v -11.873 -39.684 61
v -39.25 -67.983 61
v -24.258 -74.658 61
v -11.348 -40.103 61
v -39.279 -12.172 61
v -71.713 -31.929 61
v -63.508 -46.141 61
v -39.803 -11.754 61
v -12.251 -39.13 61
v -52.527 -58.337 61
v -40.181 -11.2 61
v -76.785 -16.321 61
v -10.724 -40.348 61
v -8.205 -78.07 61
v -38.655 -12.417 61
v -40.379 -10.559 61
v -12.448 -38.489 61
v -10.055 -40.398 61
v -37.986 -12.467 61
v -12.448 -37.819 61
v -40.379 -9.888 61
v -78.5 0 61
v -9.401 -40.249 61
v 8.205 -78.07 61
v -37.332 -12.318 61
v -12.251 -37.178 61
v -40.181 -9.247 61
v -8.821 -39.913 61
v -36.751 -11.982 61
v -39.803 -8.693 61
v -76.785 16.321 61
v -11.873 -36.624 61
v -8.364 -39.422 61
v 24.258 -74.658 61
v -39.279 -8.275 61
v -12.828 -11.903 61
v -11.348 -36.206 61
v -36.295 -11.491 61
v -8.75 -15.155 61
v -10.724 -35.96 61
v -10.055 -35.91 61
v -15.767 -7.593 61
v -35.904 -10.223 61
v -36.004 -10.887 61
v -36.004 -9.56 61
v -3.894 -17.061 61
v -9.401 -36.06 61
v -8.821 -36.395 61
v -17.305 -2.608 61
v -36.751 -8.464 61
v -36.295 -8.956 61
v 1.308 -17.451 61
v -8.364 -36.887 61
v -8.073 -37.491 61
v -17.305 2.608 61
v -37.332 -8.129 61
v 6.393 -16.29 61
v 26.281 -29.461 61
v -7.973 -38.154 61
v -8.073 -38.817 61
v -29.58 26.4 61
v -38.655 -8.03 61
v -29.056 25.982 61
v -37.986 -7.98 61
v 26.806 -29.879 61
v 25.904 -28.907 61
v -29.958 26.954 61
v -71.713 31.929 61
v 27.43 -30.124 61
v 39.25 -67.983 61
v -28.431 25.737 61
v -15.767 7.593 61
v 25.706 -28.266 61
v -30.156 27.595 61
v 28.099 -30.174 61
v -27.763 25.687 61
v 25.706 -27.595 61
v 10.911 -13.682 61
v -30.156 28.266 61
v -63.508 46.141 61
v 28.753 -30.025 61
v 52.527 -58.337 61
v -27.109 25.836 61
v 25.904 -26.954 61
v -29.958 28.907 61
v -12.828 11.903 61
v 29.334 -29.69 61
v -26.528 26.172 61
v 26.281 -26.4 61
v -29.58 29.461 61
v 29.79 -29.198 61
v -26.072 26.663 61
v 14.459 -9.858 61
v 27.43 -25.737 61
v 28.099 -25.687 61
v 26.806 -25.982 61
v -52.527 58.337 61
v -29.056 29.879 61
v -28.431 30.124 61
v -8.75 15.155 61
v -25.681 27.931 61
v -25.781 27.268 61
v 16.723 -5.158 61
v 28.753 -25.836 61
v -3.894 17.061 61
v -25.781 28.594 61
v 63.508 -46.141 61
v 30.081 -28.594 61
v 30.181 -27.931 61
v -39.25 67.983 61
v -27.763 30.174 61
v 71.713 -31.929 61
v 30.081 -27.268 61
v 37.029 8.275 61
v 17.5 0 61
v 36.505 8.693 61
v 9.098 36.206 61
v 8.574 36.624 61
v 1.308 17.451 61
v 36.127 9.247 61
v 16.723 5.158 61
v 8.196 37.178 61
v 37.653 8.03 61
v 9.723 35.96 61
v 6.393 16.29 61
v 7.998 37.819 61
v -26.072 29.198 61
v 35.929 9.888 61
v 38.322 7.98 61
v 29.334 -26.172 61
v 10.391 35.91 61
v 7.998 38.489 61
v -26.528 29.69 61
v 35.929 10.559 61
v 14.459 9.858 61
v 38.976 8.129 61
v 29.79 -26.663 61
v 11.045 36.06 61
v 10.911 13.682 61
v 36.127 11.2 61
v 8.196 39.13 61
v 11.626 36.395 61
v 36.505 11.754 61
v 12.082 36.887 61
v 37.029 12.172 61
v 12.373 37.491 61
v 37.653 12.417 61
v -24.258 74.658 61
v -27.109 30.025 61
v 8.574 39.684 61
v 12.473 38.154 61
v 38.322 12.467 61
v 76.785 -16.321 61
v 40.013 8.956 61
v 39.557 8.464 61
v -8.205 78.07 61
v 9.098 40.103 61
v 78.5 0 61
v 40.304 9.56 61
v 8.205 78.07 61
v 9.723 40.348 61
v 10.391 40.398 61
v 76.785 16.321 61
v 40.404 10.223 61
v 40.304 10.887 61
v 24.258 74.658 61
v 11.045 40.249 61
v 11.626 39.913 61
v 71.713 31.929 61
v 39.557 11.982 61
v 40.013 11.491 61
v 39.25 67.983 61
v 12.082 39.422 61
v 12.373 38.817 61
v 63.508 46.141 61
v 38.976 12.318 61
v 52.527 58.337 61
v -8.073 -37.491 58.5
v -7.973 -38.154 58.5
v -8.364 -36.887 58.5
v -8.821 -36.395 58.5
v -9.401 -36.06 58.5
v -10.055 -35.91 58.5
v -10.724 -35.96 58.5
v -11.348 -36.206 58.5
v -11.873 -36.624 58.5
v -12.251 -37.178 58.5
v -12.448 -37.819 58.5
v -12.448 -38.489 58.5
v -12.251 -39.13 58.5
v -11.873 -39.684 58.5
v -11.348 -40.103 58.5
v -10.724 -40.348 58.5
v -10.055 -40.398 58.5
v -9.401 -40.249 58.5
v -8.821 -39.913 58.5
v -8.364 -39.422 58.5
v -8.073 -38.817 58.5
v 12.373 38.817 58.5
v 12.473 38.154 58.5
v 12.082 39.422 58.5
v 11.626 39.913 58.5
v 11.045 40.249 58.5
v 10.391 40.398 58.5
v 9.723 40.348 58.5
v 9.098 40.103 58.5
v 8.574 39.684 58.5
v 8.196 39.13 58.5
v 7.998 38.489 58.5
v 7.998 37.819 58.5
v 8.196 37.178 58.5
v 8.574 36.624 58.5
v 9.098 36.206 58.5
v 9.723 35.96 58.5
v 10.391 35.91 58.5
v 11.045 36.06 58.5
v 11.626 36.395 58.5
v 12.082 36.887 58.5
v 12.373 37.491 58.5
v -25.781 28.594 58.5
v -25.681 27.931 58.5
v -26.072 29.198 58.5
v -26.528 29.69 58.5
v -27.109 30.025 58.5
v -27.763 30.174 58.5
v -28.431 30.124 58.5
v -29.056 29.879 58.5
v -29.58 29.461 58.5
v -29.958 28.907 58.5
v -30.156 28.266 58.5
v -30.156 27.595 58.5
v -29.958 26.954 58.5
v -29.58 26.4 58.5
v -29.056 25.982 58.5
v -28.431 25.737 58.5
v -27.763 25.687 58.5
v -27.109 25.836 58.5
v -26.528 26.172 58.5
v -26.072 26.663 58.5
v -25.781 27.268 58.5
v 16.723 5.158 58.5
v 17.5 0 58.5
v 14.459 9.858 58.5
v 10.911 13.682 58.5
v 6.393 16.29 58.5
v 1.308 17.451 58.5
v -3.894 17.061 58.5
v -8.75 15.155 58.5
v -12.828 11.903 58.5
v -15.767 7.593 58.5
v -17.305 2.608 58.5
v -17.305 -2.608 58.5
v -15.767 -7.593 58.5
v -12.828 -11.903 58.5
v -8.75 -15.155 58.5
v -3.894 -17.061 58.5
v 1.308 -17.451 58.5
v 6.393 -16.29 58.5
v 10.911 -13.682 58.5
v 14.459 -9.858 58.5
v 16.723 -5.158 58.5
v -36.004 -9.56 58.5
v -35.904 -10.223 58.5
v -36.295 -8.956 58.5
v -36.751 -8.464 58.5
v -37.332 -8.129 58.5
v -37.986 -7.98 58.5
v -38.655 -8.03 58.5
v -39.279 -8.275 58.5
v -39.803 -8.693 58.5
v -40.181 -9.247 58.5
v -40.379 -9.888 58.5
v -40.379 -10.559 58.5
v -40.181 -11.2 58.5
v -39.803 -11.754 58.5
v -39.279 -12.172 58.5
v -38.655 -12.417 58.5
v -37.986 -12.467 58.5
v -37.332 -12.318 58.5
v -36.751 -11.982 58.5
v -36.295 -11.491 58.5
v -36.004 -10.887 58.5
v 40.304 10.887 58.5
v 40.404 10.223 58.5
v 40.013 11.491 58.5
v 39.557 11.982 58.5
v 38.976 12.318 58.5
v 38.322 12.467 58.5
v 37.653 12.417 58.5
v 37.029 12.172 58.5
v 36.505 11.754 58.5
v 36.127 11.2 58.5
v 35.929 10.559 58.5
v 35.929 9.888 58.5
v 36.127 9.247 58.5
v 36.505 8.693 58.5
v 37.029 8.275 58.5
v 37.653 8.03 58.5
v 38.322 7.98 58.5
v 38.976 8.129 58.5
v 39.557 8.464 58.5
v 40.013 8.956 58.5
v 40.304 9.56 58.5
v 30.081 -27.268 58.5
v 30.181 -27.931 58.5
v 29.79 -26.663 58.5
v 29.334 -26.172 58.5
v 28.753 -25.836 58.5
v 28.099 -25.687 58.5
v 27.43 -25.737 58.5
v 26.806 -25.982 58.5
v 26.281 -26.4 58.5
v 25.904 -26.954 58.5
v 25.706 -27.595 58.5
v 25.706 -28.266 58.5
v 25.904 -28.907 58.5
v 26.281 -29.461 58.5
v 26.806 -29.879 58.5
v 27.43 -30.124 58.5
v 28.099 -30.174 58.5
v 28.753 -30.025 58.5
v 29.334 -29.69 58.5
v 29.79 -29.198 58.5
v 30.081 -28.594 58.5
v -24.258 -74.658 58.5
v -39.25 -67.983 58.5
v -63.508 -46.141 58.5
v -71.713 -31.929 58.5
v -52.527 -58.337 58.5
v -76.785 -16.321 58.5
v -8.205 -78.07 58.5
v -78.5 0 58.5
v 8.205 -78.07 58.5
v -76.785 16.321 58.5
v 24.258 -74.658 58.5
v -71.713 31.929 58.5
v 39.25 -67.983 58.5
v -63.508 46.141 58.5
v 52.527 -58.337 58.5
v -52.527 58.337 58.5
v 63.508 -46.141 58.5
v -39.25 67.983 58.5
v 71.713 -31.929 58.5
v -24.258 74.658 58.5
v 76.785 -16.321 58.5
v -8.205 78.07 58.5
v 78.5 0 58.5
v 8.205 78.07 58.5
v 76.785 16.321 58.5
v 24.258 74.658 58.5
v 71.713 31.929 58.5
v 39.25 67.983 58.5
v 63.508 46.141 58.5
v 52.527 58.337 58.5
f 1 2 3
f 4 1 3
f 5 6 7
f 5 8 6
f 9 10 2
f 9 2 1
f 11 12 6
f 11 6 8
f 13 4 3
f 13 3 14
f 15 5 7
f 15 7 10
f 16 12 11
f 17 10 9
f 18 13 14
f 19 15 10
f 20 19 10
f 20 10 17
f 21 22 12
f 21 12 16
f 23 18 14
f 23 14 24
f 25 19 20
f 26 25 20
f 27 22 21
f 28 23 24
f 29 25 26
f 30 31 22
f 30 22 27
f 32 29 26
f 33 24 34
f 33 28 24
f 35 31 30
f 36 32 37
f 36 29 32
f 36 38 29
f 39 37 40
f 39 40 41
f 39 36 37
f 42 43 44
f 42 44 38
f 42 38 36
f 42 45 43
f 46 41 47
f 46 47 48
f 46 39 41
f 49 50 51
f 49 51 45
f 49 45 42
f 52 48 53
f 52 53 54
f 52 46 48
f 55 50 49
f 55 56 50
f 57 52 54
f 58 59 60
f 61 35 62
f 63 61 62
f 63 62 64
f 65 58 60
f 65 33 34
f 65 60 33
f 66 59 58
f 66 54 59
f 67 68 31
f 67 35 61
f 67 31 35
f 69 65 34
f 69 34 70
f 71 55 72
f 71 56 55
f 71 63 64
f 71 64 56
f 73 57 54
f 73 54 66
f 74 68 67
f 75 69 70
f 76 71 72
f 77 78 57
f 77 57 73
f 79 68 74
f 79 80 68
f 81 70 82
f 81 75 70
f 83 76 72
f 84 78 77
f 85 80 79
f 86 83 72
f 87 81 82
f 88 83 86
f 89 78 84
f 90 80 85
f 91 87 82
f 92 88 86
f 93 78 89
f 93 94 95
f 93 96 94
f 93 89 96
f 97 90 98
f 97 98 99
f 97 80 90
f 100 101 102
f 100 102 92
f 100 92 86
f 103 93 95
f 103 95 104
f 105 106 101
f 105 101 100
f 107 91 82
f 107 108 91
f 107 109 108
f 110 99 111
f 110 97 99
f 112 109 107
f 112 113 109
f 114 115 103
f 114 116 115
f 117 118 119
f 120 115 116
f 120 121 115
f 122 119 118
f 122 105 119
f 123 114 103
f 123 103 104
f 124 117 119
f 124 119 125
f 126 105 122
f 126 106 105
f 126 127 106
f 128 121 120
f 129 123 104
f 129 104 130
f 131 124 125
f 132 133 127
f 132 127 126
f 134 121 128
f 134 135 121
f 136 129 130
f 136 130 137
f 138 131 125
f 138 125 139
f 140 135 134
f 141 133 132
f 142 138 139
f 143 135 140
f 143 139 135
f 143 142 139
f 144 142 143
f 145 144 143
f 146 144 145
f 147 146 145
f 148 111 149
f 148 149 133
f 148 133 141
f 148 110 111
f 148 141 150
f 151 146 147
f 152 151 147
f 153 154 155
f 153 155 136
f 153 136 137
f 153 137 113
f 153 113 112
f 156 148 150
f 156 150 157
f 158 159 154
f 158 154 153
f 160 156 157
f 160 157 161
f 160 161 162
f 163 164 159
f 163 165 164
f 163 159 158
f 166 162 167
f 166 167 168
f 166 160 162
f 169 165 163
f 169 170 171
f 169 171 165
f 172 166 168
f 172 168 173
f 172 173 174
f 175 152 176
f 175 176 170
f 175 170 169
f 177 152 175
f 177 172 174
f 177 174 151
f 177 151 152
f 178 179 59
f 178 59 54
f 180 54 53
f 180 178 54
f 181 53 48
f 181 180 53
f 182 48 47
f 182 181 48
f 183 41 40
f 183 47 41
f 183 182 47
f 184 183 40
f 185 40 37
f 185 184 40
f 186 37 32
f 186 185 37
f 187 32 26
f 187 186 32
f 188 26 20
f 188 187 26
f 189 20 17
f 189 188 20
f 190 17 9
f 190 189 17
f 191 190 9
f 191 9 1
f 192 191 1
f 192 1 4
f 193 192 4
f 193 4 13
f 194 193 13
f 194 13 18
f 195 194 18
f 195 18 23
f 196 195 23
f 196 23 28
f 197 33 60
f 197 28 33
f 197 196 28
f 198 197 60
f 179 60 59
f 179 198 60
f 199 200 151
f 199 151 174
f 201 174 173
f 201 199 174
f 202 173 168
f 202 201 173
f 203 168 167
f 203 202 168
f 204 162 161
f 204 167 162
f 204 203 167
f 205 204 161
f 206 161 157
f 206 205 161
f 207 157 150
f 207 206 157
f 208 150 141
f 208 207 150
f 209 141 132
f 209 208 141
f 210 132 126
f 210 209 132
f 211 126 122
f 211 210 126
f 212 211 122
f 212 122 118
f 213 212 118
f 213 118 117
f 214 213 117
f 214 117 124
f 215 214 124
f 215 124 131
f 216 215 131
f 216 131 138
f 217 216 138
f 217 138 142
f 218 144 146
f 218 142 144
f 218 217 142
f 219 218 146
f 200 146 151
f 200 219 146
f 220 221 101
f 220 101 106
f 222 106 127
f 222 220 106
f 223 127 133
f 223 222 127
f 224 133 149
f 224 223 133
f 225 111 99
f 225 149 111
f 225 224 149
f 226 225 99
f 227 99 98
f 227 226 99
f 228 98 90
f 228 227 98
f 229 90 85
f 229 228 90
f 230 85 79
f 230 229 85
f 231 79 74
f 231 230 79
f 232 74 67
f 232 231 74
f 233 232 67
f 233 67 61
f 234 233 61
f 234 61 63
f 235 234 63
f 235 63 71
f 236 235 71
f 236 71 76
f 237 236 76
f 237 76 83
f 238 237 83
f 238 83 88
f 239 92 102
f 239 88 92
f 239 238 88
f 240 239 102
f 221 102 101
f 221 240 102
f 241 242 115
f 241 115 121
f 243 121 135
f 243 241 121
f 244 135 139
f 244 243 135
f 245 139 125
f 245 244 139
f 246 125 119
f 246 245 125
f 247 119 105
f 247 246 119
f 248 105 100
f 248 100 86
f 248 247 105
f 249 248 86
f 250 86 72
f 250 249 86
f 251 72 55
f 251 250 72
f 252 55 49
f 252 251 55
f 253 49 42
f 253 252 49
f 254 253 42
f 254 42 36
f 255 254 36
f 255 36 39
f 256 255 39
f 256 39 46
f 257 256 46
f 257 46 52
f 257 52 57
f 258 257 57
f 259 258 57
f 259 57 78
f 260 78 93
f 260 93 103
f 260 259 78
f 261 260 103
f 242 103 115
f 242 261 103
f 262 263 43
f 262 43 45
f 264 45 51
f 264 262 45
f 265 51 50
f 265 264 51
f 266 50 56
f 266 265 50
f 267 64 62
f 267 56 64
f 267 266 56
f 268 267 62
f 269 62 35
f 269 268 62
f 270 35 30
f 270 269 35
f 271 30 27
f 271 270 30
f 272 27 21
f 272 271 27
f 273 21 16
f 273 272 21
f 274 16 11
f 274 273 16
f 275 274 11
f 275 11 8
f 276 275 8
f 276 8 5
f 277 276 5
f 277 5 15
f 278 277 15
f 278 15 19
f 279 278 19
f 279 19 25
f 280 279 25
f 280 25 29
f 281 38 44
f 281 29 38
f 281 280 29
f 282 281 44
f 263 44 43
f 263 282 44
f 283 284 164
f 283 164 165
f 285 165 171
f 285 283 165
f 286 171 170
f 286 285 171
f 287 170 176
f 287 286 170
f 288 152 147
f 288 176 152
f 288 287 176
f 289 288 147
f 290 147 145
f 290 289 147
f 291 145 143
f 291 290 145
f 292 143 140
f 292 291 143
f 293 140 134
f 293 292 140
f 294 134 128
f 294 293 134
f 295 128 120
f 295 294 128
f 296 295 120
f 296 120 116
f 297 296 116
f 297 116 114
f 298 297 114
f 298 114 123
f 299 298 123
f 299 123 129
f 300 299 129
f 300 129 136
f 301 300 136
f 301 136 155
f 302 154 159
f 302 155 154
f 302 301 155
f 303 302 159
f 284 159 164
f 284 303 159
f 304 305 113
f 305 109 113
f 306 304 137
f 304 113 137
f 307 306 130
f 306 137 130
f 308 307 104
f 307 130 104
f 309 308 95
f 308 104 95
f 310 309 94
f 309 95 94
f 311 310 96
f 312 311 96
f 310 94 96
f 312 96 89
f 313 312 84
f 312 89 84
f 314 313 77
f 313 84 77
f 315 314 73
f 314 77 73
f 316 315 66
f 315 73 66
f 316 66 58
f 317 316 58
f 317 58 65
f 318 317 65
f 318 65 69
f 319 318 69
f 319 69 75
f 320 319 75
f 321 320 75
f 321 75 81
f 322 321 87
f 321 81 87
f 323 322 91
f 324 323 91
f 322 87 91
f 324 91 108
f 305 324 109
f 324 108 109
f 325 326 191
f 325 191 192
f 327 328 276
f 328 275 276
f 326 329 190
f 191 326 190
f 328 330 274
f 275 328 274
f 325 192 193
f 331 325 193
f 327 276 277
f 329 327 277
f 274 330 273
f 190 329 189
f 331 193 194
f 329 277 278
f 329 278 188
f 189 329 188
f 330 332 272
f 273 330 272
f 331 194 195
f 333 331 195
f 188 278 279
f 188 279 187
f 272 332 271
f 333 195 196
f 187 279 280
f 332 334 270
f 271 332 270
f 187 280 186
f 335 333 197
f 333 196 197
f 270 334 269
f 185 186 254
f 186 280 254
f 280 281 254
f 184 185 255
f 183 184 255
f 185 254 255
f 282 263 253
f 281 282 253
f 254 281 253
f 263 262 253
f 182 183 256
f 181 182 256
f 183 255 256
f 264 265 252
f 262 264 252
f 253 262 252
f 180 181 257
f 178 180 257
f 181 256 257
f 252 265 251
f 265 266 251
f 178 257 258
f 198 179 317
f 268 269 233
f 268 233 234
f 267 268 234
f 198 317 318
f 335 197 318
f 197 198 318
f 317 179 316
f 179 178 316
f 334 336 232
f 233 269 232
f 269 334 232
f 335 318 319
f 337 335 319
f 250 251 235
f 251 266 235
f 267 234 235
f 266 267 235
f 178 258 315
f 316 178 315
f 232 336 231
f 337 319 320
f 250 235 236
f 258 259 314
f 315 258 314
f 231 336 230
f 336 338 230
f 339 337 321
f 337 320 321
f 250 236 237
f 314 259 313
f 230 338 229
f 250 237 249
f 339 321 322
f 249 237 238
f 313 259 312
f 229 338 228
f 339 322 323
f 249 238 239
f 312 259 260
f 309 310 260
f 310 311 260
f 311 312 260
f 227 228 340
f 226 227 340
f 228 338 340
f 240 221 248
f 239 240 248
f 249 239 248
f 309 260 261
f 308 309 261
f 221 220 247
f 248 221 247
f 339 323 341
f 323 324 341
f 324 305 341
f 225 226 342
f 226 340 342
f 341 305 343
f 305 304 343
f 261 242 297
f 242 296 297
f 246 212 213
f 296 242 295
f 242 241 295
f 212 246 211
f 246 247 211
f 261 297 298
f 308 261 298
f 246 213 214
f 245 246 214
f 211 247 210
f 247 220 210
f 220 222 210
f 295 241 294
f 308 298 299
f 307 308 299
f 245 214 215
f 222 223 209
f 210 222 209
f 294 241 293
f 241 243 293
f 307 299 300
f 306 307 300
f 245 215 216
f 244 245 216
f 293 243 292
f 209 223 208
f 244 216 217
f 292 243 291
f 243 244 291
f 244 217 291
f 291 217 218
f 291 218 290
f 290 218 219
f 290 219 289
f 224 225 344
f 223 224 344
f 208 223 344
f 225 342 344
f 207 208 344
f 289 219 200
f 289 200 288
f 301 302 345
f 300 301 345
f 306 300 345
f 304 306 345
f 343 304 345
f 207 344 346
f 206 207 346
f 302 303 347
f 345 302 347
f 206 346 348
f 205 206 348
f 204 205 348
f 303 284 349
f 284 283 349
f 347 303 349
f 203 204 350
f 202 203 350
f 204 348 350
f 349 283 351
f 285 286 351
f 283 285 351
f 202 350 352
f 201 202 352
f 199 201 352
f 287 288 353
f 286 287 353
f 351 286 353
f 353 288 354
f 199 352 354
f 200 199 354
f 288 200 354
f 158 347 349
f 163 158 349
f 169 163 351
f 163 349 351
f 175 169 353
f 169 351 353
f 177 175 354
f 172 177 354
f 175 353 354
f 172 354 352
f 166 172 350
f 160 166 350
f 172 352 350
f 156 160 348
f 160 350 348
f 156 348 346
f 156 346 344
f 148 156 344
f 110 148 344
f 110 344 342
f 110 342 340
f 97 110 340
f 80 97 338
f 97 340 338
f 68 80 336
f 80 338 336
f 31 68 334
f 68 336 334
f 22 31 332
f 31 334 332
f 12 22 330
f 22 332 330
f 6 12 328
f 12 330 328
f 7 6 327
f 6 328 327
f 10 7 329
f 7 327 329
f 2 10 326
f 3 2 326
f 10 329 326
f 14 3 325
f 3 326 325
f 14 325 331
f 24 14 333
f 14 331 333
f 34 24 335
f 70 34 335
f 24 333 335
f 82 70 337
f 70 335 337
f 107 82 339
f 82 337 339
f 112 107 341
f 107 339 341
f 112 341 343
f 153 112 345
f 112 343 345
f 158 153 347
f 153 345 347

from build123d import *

# Parameters (mm, degrees)
FRONT_COVER_REFERENCE_START = 58.5
SKETCH_1_R                  = 78.5
SKETCH_1_R_2                = 17.5
FRONT_COVER_REFERENCE_DEPTH = 2.5
SKETCH_2_R                  = 2.25
THROUGH_HOLES_DEPTH         = 100


with BuildPart() as part:
    # Эскиз1 → Front_cover_reference (new body)
    with BuildSketch(Plane.XY.offset(FRONT_COVER_REFERENCE_START)):
        Circle(SKETCH_1_R)
        Circle(SKETCH_1_R_2, mode=Mode.SUBTRACT)
    extrude(amount=FRONT_COVER_REFERENCE_DEPTH)

    # Эскиз2 → Through_holes (cut, symmetric)
    with BuildSketch(Plane.XY):
        with Locations((38.154070138, 10.223352282)):
            Circle(SKETCH_2_R)
        with Locations((10.223352282, 38.154070138)):
            Circle(SKETCH_2_R)
        with Locations((-27.930717857, 27.930717857)):
            Circle(SKETCH_2_R)
        with Locations((-38.154070138, -10.223352282)):
            Circle(SKETCH_2_R)
        with Locations((-10.223352282, -38.154070138)):
            Circle(SKETCH_2_R)
        with Locations((27.930717857, -27.930717857)):
            Circle(SKETCH_2_R)
    extrude(amount=THROUGH_HOLES_DEPTH, both=True, mode=Mode.SUBTRACT)


solid = part.part
